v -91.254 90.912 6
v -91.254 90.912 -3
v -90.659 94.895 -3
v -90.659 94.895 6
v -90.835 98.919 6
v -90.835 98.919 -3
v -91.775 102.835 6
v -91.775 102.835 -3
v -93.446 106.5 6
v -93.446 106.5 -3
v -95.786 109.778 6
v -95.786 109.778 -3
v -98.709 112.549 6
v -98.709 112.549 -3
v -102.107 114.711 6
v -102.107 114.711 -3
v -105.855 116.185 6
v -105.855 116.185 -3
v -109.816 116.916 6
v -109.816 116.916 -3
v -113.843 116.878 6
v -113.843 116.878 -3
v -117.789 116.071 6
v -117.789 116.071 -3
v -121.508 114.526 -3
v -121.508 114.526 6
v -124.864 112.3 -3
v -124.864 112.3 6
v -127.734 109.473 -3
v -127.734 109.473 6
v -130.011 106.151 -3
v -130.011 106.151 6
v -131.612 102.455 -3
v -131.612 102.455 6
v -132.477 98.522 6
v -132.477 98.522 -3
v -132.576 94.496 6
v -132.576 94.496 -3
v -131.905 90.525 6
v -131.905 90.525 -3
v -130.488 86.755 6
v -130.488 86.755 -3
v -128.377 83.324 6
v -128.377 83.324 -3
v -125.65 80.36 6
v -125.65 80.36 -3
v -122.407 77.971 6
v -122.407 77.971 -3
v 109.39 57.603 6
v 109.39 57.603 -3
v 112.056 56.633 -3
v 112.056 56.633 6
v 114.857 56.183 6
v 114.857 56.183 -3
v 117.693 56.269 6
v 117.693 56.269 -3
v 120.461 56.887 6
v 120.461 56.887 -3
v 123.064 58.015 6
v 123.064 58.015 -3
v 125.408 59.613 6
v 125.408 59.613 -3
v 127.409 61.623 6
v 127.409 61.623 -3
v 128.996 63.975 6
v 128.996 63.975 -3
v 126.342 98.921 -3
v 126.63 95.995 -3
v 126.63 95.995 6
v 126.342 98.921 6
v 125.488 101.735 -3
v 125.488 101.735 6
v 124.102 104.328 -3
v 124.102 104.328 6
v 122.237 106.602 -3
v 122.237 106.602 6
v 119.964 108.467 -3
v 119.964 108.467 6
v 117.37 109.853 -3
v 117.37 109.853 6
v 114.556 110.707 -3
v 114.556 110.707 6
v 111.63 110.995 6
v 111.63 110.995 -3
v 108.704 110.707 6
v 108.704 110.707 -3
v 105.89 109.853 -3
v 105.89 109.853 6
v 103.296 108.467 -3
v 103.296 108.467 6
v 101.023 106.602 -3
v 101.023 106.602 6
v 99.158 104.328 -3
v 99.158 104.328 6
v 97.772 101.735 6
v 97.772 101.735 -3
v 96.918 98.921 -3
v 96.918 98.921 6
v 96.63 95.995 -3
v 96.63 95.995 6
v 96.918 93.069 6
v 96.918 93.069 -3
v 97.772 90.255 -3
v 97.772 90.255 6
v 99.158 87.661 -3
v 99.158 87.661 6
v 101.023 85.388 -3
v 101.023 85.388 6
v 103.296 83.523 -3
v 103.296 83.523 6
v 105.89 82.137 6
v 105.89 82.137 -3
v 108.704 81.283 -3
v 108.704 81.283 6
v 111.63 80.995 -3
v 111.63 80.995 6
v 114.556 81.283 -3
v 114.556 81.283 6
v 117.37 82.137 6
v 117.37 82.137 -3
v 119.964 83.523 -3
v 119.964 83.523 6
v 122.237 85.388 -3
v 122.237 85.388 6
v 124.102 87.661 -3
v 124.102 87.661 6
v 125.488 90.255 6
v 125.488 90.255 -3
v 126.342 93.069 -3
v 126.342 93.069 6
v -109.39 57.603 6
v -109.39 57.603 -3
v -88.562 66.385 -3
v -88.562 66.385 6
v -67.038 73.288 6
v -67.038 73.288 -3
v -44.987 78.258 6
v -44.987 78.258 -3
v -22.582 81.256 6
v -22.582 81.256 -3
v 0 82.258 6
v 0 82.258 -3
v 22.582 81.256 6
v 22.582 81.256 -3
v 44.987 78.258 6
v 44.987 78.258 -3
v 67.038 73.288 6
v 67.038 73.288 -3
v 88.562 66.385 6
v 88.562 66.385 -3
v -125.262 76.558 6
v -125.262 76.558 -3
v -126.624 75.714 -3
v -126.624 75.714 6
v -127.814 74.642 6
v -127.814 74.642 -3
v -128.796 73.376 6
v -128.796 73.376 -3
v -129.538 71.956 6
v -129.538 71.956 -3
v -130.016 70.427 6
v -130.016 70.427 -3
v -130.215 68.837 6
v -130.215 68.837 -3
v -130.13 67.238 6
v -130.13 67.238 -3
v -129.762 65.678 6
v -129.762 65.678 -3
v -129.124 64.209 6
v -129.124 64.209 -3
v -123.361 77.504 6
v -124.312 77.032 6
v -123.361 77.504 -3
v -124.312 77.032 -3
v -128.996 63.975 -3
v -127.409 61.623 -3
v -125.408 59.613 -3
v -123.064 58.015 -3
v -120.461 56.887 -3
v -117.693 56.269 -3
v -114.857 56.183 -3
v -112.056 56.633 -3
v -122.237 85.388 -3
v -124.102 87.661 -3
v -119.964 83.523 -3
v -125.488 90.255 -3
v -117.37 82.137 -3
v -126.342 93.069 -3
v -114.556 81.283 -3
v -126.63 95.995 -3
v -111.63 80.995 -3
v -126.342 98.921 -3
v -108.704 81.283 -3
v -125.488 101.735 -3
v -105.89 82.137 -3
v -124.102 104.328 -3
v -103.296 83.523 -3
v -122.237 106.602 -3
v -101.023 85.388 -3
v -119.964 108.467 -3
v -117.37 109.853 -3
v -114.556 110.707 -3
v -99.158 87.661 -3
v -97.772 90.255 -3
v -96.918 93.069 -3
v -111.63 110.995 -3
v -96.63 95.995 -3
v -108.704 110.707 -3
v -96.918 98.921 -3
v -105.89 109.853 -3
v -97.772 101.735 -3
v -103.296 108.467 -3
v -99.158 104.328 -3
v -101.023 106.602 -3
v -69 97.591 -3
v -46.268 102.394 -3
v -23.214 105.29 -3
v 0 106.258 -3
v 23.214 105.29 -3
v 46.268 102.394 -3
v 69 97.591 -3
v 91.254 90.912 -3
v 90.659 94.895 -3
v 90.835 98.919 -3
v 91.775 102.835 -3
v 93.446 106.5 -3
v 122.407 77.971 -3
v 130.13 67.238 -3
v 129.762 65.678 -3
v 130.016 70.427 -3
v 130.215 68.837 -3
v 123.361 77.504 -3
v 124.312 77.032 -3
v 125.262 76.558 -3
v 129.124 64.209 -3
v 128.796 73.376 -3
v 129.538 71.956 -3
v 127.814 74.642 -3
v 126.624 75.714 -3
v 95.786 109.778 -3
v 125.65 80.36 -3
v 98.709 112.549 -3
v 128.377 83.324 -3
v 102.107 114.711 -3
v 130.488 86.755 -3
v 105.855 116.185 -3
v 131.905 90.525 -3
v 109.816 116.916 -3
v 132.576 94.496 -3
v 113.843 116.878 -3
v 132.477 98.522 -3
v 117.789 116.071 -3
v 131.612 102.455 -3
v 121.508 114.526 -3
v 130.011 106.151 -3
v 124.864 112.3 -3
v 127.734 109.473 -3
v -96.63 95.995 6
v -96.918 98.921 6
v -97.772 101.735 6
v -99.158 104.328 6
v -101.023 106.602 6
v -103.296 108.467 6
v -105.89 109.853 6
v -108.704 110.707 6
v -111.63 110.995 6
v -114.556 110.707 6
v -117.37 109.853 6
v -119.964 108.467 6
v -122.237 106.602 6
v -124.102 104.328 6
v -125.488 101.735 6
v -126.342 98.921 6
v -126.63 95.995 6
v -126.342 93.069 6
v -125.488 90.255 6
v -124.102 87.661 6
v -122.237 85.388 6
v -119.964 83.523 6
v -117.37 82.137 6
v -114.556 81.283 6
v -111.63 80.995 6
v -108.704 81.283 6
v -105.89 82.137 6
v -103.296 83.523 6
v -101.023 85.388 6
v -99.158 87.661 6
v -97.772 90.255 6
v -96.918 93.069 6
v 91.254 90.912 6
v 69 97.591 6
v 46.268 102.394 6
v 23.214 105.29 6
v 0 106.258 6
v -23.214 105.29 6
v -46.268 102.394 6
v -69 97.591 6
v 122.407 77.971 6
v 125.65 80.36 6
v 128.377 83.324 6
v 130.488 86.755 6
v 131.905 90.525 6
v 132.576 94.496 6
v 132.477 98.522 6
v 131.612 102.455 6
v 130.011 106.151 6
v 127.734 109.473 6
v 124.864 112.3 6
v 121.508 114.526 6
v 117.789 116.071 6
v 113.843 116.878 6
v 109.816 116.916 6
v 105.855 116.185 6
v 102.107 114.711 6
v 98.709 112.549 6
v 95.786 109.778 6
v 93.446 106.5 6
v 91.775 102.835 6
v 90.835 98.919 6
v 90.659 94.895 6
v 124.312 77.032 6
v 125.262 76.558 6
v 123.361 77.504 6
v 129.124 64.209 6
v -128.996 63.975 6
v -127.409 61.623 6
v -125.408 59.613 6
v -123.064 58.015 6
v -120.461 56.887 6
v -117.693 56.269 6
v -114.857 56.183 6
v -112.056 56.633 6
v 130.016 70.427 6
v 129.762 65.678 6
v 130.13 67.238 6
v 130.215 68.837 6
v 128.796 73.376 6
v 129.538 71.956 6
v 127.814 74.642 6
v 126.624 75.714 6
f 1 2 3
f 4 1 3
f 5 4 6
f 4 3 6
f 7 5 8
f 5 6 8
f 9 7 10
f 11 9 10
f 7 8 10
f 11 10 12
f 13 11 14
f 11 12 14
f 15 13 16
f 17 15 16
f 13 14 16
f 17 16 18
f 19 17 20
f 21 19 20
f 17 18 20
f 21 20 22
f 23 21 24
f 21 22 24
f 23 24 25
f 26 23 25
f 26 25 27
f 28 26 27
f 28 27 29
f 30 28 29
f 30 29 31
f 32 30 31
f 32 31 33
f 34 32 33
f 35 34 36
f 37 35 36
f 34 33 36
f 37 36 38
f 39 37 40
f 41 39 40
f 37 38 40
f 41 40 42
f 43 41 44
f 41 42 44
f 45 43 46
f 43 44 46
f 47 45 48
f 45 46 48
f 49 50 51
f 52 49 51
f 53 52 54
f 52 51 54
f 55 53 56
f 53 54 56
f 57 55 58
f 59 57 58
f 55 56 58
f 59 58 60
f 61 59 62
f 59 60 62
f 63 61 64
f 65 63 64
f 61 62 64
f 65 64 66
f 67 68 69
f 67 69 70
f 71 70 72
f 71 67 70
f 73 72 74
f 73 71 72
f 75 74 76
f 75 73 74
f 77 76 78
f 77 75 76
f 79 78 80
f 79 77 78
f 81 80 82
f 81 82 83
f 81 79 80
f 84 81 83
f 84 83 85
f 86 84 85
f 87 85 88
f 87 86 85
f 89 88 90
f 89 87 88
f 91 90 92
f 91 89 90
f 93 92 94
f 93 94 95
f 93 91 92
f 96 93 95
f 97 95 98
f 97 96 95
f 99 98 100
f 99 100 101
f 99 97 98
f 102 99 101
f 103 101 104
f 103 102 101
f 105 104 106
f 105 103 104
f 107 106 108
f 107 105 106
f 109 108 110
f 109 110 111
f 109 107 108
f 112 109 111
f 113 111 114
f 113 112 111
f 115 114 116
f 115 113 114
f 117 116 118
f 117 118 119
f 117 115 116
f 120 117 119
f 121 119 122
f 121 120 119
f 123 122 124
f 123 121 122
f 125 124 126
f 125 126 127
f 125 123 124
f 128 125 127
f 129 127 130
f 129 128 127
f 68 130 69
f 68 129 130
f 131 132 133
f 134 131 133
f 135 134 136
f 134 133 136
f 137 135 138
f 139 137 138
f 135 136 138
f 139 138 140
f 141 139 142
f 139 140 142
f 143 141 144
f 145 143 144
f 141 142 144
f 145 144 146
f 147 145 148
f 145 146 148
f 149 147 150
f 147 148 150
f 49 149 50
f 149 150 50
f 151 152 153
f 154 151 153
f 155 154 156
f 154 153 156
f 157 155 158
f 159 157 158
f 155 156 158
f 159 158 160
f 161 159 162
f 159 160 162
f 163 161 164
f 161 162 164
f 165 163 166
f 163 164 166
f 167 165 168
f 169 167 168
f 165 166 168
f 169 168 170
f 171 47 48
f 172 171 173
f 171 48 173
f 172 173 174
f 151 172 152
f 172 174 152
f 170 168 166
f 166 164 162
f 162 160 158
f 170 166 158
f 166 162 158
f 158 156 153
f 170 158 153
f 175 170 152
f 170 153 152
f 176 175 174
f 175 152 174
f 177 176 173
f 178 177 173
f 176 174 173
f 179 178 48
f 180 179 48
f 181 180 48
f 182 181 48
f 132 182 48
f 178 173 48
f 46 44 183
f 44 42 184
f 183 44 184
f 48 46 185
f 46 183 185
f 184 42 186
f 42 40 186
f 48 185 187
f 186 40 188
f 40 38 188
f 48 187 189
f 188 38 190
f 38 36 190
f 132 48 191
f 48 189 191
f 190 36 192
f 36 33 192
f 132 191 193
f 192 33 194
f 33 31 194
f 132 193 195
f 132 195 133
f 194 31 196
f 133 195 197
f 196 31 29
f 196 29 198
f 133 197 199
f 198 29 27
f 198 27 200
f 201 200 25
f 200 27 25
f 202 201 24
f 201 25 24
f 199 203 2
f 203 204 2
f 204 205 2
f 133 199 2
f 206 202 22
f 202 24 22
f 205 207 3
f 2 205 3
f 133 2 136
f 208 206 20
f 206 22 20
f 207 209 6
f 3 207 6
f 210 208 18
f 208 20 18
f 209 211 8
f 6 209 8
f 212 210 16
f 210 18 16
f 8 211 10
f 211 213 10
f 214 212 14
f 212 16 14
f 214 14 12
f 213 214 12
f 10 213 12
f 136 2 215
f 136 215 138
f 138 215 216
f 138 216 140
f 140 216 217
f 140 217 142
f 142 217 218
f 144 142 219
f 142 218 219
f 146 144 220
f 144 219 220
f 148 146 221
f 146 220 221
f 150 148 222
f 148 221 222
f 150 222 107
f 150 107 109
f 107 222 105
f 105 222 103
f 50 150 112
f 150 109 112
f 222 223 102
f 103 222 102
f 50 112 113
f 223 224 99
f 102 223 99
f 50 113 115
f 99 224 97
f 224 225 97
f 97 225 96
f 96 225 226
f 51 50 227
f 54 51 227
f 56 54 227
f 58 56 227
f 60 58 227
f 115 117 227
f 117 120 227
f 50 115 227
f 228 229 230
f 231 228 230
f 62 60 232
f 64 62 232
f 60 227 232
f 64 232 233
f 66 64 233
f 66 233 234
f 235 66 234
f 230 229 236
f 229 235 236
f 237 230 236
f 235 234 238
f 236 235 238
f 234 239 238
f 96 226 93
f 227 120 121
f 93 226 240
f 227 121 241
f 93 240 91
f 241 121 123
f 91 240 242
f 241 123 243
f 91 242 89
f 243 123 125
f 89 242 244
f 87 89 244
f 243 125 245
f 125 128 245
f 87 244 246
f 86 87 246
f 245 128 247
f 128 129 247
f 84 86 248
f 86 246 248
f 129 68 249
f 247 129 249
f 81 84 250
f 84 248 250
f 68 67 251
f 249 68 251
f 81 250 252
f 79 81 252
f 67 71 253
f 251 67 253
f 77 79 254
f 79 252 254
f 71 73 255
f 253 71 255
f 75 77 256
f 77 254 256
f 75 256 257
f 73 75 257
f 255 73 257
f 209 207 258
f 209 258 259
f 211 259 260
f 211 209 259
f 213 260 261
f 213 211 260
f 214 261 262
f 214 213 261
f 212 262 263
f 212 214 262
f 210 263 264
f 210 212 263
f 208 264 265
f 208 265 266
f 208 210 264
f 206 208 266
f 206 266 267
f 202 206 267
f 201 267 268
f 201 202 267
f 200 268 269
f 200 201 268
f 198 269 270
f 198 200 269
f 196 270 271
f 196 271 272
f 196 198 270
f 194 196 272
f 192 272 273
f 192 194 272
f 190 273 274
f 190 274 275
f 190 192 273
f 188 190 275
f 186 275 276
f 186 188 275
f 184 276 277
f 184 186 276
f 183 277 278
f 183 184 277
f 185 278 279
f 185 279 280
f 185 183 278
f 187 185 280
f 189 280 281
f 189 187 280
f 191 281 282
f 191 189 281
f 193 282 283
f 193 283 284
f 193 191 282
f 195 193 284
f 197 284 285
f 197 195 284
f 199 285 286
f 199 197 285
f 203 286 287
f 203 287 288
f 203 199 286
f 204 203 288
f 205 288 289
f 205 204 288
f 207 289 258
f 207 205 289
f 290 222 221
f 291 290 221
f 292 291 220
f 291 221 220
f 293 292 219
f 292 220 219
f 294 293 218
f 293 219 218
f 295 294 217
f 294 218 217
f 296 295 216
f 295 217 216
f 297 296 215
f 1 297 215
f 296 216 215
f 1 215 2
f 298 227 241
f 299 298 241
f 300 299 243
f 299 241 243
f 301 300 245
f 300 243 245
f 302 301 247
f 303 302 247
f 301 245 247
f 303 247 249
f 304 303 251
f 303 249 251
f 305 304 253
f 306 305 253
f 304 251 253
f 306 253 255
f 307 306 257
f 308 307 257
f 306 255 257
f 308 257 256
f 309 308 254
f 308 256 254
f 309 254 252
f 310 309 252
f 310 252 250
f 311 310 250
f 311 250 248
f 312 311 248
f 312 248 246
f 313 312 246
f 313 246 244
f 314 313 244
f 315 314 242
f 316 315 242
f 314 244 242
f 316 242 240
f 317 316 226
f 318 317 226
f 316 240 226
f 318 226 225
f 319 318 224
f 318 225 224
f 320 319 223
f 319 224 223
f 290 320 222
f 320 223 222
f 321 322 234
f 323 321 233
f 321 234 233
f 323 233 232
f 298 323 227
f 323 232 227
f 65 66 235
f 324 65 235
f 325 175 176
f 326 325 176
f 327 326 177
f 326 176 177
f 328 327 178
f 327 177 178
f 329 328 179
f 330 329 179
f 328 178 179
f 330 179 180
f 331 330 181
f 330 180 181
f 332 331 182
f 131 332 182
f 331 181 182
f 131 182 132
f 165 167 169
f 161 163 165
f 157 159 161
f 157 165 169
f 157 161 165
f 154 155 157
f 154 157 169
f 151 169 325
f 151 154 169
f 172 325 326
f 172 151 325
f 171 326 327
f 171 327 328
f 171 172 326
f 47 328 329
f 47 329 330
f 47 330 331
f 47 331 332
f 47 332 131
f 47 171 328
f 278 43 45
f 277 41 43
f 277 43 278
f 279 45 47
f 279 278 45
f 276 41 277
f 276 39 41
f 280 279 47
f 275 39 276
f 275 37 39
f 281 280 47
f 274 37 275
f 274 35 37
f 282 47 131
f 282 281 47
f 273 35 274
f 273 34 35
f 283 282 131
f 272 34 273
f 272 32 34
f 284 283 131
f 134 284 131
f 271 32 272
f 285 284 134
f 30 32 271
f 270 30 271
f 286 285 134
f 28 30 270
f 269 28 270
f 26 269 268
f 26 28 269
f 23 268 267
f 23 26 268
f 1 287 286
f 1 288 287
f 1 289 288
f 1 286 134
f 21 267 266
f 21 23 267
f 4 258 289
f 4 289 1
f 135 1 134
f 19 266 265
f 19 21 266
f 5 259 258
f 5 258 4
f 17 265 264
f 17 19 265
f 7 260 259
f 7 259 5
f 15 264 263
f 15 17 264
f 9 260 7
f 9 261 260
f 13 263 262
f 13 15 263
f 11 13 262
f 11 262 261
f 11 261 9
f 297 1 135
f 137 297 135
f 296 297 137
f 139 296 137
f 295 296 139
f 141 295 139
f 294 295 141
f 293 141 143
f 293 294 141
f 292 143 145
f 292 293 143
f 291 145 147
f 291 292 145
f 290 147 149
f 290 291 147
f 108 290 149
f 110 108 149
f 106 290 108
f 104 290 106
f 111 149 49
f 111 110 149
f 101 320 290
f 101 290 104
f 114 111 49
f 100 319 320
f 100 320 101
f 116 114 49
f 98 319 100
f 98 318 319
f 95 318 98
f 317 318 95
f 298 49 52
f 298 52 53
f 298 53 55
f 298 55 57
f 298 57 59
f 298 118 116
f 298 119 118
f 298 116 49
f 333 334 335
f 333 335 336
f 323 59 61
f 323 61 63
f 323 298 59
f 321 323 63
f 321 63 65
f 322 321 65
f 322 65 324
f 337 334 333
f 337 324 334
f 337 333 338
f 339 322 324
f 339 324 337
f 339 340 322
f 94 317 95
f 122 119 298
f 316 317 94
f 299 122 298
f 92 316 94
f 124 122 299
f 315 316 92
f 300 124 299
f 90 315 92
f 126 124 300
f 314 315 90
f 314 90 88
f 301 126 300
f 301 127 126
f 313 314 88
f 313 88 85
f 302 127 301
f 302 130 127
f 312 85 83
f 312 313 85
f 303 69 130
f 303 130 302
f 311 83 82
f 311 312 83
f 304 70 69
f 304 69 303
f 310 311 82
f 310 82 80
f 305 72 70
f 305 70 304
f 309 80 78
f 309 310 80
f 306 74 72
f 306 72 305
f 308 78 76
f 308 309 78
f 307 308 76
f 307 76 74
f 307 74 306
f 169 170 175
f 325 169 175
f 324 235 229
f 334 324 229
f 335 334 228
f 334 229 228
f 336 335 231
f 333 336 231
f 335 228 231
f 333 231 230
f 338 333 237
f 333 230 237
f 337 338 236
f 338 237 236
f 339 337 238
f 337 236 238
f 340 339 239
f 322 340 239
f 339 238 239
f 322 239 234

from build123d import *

# Parameters (mm, degrees)
SKETCH1_R           = 5
BOSS_EXTRUDE1_DEPTH = 3
SCALE1_SCALE        = 3


with BuildPart() as part:
    # Sketch1 → Boss-Extrude1 (new body)
    with BuildSketch(Plane.XY):
        with BuildLine():
            ThreePointArc((-41.753986468, 83.099967593), (-43.270314203, 81.314818292), (-43.041341374, 78.983814372))
            Line((-43.041341374, 78.983814372), (-42.998763062, 78.905680247))
            ThreePointArc((-42.998763062, 78.905680247), (-40.153807851, 76.543039354), (-36.463426148, 76.781629011))
            ThreePointArc((-36.463426148, 76.781629011), (0, 85), (36.463426148, 76.781629011))
            ThreePointArc((36.463426148, 76.781629011), (40.153807851, 76.543039354), (42.998763062, 78.905680247))
            Line((42.998763062, 78.905680247), (43.041341374, 78.983814372))
            ThreePointArc((43.041341374, 78.983814372), (43.270314203, 81.314818292), (41.753986468, 83.099967593))
            ThreePointArc((41.753986468, 83.099967593), (41.278907761, 83.336977231), (40.802483763, 83.571270894))
            ThreePointArc((40.802483763, 83.571270894), (39.895257732, 96.043575582), (30.418144359, 87.884791026))
            ThreePointArc((30.418144359, 87.884791026), (0, 93), (-30.418144359, 87.884791026))
            ThreePointArc((-30.418144359, 87.884791026), (-39.895257732, 96.043575582), (-40.802483763, 83.571270894))
            ThreePointArc((-40.802483763, 83.571270894), (-41.278907761, 83.336977231), (-41.753986468, 83.099967593))
        make_face()
        with Locations((-37.21, 89.579104148)):
            Circle(SKETCH1_R, mode=Mode.SUBTRACT)
        with Locations((37.21, 89.579104148)):
            Circle(SKETCH1_R, mode=Mode.SUBTRACT)
    extrude(amount=BOSS_EXTRUDE1_DEPTH)


with BuildPart() as part_1:
    # Scale1: scaled about (0, 86.37118339, 1.5)
    add(part.part.scale(SCALE1_SCALE).moved(Location((0, -172.74236678, -3))))


solid = part_1.part
